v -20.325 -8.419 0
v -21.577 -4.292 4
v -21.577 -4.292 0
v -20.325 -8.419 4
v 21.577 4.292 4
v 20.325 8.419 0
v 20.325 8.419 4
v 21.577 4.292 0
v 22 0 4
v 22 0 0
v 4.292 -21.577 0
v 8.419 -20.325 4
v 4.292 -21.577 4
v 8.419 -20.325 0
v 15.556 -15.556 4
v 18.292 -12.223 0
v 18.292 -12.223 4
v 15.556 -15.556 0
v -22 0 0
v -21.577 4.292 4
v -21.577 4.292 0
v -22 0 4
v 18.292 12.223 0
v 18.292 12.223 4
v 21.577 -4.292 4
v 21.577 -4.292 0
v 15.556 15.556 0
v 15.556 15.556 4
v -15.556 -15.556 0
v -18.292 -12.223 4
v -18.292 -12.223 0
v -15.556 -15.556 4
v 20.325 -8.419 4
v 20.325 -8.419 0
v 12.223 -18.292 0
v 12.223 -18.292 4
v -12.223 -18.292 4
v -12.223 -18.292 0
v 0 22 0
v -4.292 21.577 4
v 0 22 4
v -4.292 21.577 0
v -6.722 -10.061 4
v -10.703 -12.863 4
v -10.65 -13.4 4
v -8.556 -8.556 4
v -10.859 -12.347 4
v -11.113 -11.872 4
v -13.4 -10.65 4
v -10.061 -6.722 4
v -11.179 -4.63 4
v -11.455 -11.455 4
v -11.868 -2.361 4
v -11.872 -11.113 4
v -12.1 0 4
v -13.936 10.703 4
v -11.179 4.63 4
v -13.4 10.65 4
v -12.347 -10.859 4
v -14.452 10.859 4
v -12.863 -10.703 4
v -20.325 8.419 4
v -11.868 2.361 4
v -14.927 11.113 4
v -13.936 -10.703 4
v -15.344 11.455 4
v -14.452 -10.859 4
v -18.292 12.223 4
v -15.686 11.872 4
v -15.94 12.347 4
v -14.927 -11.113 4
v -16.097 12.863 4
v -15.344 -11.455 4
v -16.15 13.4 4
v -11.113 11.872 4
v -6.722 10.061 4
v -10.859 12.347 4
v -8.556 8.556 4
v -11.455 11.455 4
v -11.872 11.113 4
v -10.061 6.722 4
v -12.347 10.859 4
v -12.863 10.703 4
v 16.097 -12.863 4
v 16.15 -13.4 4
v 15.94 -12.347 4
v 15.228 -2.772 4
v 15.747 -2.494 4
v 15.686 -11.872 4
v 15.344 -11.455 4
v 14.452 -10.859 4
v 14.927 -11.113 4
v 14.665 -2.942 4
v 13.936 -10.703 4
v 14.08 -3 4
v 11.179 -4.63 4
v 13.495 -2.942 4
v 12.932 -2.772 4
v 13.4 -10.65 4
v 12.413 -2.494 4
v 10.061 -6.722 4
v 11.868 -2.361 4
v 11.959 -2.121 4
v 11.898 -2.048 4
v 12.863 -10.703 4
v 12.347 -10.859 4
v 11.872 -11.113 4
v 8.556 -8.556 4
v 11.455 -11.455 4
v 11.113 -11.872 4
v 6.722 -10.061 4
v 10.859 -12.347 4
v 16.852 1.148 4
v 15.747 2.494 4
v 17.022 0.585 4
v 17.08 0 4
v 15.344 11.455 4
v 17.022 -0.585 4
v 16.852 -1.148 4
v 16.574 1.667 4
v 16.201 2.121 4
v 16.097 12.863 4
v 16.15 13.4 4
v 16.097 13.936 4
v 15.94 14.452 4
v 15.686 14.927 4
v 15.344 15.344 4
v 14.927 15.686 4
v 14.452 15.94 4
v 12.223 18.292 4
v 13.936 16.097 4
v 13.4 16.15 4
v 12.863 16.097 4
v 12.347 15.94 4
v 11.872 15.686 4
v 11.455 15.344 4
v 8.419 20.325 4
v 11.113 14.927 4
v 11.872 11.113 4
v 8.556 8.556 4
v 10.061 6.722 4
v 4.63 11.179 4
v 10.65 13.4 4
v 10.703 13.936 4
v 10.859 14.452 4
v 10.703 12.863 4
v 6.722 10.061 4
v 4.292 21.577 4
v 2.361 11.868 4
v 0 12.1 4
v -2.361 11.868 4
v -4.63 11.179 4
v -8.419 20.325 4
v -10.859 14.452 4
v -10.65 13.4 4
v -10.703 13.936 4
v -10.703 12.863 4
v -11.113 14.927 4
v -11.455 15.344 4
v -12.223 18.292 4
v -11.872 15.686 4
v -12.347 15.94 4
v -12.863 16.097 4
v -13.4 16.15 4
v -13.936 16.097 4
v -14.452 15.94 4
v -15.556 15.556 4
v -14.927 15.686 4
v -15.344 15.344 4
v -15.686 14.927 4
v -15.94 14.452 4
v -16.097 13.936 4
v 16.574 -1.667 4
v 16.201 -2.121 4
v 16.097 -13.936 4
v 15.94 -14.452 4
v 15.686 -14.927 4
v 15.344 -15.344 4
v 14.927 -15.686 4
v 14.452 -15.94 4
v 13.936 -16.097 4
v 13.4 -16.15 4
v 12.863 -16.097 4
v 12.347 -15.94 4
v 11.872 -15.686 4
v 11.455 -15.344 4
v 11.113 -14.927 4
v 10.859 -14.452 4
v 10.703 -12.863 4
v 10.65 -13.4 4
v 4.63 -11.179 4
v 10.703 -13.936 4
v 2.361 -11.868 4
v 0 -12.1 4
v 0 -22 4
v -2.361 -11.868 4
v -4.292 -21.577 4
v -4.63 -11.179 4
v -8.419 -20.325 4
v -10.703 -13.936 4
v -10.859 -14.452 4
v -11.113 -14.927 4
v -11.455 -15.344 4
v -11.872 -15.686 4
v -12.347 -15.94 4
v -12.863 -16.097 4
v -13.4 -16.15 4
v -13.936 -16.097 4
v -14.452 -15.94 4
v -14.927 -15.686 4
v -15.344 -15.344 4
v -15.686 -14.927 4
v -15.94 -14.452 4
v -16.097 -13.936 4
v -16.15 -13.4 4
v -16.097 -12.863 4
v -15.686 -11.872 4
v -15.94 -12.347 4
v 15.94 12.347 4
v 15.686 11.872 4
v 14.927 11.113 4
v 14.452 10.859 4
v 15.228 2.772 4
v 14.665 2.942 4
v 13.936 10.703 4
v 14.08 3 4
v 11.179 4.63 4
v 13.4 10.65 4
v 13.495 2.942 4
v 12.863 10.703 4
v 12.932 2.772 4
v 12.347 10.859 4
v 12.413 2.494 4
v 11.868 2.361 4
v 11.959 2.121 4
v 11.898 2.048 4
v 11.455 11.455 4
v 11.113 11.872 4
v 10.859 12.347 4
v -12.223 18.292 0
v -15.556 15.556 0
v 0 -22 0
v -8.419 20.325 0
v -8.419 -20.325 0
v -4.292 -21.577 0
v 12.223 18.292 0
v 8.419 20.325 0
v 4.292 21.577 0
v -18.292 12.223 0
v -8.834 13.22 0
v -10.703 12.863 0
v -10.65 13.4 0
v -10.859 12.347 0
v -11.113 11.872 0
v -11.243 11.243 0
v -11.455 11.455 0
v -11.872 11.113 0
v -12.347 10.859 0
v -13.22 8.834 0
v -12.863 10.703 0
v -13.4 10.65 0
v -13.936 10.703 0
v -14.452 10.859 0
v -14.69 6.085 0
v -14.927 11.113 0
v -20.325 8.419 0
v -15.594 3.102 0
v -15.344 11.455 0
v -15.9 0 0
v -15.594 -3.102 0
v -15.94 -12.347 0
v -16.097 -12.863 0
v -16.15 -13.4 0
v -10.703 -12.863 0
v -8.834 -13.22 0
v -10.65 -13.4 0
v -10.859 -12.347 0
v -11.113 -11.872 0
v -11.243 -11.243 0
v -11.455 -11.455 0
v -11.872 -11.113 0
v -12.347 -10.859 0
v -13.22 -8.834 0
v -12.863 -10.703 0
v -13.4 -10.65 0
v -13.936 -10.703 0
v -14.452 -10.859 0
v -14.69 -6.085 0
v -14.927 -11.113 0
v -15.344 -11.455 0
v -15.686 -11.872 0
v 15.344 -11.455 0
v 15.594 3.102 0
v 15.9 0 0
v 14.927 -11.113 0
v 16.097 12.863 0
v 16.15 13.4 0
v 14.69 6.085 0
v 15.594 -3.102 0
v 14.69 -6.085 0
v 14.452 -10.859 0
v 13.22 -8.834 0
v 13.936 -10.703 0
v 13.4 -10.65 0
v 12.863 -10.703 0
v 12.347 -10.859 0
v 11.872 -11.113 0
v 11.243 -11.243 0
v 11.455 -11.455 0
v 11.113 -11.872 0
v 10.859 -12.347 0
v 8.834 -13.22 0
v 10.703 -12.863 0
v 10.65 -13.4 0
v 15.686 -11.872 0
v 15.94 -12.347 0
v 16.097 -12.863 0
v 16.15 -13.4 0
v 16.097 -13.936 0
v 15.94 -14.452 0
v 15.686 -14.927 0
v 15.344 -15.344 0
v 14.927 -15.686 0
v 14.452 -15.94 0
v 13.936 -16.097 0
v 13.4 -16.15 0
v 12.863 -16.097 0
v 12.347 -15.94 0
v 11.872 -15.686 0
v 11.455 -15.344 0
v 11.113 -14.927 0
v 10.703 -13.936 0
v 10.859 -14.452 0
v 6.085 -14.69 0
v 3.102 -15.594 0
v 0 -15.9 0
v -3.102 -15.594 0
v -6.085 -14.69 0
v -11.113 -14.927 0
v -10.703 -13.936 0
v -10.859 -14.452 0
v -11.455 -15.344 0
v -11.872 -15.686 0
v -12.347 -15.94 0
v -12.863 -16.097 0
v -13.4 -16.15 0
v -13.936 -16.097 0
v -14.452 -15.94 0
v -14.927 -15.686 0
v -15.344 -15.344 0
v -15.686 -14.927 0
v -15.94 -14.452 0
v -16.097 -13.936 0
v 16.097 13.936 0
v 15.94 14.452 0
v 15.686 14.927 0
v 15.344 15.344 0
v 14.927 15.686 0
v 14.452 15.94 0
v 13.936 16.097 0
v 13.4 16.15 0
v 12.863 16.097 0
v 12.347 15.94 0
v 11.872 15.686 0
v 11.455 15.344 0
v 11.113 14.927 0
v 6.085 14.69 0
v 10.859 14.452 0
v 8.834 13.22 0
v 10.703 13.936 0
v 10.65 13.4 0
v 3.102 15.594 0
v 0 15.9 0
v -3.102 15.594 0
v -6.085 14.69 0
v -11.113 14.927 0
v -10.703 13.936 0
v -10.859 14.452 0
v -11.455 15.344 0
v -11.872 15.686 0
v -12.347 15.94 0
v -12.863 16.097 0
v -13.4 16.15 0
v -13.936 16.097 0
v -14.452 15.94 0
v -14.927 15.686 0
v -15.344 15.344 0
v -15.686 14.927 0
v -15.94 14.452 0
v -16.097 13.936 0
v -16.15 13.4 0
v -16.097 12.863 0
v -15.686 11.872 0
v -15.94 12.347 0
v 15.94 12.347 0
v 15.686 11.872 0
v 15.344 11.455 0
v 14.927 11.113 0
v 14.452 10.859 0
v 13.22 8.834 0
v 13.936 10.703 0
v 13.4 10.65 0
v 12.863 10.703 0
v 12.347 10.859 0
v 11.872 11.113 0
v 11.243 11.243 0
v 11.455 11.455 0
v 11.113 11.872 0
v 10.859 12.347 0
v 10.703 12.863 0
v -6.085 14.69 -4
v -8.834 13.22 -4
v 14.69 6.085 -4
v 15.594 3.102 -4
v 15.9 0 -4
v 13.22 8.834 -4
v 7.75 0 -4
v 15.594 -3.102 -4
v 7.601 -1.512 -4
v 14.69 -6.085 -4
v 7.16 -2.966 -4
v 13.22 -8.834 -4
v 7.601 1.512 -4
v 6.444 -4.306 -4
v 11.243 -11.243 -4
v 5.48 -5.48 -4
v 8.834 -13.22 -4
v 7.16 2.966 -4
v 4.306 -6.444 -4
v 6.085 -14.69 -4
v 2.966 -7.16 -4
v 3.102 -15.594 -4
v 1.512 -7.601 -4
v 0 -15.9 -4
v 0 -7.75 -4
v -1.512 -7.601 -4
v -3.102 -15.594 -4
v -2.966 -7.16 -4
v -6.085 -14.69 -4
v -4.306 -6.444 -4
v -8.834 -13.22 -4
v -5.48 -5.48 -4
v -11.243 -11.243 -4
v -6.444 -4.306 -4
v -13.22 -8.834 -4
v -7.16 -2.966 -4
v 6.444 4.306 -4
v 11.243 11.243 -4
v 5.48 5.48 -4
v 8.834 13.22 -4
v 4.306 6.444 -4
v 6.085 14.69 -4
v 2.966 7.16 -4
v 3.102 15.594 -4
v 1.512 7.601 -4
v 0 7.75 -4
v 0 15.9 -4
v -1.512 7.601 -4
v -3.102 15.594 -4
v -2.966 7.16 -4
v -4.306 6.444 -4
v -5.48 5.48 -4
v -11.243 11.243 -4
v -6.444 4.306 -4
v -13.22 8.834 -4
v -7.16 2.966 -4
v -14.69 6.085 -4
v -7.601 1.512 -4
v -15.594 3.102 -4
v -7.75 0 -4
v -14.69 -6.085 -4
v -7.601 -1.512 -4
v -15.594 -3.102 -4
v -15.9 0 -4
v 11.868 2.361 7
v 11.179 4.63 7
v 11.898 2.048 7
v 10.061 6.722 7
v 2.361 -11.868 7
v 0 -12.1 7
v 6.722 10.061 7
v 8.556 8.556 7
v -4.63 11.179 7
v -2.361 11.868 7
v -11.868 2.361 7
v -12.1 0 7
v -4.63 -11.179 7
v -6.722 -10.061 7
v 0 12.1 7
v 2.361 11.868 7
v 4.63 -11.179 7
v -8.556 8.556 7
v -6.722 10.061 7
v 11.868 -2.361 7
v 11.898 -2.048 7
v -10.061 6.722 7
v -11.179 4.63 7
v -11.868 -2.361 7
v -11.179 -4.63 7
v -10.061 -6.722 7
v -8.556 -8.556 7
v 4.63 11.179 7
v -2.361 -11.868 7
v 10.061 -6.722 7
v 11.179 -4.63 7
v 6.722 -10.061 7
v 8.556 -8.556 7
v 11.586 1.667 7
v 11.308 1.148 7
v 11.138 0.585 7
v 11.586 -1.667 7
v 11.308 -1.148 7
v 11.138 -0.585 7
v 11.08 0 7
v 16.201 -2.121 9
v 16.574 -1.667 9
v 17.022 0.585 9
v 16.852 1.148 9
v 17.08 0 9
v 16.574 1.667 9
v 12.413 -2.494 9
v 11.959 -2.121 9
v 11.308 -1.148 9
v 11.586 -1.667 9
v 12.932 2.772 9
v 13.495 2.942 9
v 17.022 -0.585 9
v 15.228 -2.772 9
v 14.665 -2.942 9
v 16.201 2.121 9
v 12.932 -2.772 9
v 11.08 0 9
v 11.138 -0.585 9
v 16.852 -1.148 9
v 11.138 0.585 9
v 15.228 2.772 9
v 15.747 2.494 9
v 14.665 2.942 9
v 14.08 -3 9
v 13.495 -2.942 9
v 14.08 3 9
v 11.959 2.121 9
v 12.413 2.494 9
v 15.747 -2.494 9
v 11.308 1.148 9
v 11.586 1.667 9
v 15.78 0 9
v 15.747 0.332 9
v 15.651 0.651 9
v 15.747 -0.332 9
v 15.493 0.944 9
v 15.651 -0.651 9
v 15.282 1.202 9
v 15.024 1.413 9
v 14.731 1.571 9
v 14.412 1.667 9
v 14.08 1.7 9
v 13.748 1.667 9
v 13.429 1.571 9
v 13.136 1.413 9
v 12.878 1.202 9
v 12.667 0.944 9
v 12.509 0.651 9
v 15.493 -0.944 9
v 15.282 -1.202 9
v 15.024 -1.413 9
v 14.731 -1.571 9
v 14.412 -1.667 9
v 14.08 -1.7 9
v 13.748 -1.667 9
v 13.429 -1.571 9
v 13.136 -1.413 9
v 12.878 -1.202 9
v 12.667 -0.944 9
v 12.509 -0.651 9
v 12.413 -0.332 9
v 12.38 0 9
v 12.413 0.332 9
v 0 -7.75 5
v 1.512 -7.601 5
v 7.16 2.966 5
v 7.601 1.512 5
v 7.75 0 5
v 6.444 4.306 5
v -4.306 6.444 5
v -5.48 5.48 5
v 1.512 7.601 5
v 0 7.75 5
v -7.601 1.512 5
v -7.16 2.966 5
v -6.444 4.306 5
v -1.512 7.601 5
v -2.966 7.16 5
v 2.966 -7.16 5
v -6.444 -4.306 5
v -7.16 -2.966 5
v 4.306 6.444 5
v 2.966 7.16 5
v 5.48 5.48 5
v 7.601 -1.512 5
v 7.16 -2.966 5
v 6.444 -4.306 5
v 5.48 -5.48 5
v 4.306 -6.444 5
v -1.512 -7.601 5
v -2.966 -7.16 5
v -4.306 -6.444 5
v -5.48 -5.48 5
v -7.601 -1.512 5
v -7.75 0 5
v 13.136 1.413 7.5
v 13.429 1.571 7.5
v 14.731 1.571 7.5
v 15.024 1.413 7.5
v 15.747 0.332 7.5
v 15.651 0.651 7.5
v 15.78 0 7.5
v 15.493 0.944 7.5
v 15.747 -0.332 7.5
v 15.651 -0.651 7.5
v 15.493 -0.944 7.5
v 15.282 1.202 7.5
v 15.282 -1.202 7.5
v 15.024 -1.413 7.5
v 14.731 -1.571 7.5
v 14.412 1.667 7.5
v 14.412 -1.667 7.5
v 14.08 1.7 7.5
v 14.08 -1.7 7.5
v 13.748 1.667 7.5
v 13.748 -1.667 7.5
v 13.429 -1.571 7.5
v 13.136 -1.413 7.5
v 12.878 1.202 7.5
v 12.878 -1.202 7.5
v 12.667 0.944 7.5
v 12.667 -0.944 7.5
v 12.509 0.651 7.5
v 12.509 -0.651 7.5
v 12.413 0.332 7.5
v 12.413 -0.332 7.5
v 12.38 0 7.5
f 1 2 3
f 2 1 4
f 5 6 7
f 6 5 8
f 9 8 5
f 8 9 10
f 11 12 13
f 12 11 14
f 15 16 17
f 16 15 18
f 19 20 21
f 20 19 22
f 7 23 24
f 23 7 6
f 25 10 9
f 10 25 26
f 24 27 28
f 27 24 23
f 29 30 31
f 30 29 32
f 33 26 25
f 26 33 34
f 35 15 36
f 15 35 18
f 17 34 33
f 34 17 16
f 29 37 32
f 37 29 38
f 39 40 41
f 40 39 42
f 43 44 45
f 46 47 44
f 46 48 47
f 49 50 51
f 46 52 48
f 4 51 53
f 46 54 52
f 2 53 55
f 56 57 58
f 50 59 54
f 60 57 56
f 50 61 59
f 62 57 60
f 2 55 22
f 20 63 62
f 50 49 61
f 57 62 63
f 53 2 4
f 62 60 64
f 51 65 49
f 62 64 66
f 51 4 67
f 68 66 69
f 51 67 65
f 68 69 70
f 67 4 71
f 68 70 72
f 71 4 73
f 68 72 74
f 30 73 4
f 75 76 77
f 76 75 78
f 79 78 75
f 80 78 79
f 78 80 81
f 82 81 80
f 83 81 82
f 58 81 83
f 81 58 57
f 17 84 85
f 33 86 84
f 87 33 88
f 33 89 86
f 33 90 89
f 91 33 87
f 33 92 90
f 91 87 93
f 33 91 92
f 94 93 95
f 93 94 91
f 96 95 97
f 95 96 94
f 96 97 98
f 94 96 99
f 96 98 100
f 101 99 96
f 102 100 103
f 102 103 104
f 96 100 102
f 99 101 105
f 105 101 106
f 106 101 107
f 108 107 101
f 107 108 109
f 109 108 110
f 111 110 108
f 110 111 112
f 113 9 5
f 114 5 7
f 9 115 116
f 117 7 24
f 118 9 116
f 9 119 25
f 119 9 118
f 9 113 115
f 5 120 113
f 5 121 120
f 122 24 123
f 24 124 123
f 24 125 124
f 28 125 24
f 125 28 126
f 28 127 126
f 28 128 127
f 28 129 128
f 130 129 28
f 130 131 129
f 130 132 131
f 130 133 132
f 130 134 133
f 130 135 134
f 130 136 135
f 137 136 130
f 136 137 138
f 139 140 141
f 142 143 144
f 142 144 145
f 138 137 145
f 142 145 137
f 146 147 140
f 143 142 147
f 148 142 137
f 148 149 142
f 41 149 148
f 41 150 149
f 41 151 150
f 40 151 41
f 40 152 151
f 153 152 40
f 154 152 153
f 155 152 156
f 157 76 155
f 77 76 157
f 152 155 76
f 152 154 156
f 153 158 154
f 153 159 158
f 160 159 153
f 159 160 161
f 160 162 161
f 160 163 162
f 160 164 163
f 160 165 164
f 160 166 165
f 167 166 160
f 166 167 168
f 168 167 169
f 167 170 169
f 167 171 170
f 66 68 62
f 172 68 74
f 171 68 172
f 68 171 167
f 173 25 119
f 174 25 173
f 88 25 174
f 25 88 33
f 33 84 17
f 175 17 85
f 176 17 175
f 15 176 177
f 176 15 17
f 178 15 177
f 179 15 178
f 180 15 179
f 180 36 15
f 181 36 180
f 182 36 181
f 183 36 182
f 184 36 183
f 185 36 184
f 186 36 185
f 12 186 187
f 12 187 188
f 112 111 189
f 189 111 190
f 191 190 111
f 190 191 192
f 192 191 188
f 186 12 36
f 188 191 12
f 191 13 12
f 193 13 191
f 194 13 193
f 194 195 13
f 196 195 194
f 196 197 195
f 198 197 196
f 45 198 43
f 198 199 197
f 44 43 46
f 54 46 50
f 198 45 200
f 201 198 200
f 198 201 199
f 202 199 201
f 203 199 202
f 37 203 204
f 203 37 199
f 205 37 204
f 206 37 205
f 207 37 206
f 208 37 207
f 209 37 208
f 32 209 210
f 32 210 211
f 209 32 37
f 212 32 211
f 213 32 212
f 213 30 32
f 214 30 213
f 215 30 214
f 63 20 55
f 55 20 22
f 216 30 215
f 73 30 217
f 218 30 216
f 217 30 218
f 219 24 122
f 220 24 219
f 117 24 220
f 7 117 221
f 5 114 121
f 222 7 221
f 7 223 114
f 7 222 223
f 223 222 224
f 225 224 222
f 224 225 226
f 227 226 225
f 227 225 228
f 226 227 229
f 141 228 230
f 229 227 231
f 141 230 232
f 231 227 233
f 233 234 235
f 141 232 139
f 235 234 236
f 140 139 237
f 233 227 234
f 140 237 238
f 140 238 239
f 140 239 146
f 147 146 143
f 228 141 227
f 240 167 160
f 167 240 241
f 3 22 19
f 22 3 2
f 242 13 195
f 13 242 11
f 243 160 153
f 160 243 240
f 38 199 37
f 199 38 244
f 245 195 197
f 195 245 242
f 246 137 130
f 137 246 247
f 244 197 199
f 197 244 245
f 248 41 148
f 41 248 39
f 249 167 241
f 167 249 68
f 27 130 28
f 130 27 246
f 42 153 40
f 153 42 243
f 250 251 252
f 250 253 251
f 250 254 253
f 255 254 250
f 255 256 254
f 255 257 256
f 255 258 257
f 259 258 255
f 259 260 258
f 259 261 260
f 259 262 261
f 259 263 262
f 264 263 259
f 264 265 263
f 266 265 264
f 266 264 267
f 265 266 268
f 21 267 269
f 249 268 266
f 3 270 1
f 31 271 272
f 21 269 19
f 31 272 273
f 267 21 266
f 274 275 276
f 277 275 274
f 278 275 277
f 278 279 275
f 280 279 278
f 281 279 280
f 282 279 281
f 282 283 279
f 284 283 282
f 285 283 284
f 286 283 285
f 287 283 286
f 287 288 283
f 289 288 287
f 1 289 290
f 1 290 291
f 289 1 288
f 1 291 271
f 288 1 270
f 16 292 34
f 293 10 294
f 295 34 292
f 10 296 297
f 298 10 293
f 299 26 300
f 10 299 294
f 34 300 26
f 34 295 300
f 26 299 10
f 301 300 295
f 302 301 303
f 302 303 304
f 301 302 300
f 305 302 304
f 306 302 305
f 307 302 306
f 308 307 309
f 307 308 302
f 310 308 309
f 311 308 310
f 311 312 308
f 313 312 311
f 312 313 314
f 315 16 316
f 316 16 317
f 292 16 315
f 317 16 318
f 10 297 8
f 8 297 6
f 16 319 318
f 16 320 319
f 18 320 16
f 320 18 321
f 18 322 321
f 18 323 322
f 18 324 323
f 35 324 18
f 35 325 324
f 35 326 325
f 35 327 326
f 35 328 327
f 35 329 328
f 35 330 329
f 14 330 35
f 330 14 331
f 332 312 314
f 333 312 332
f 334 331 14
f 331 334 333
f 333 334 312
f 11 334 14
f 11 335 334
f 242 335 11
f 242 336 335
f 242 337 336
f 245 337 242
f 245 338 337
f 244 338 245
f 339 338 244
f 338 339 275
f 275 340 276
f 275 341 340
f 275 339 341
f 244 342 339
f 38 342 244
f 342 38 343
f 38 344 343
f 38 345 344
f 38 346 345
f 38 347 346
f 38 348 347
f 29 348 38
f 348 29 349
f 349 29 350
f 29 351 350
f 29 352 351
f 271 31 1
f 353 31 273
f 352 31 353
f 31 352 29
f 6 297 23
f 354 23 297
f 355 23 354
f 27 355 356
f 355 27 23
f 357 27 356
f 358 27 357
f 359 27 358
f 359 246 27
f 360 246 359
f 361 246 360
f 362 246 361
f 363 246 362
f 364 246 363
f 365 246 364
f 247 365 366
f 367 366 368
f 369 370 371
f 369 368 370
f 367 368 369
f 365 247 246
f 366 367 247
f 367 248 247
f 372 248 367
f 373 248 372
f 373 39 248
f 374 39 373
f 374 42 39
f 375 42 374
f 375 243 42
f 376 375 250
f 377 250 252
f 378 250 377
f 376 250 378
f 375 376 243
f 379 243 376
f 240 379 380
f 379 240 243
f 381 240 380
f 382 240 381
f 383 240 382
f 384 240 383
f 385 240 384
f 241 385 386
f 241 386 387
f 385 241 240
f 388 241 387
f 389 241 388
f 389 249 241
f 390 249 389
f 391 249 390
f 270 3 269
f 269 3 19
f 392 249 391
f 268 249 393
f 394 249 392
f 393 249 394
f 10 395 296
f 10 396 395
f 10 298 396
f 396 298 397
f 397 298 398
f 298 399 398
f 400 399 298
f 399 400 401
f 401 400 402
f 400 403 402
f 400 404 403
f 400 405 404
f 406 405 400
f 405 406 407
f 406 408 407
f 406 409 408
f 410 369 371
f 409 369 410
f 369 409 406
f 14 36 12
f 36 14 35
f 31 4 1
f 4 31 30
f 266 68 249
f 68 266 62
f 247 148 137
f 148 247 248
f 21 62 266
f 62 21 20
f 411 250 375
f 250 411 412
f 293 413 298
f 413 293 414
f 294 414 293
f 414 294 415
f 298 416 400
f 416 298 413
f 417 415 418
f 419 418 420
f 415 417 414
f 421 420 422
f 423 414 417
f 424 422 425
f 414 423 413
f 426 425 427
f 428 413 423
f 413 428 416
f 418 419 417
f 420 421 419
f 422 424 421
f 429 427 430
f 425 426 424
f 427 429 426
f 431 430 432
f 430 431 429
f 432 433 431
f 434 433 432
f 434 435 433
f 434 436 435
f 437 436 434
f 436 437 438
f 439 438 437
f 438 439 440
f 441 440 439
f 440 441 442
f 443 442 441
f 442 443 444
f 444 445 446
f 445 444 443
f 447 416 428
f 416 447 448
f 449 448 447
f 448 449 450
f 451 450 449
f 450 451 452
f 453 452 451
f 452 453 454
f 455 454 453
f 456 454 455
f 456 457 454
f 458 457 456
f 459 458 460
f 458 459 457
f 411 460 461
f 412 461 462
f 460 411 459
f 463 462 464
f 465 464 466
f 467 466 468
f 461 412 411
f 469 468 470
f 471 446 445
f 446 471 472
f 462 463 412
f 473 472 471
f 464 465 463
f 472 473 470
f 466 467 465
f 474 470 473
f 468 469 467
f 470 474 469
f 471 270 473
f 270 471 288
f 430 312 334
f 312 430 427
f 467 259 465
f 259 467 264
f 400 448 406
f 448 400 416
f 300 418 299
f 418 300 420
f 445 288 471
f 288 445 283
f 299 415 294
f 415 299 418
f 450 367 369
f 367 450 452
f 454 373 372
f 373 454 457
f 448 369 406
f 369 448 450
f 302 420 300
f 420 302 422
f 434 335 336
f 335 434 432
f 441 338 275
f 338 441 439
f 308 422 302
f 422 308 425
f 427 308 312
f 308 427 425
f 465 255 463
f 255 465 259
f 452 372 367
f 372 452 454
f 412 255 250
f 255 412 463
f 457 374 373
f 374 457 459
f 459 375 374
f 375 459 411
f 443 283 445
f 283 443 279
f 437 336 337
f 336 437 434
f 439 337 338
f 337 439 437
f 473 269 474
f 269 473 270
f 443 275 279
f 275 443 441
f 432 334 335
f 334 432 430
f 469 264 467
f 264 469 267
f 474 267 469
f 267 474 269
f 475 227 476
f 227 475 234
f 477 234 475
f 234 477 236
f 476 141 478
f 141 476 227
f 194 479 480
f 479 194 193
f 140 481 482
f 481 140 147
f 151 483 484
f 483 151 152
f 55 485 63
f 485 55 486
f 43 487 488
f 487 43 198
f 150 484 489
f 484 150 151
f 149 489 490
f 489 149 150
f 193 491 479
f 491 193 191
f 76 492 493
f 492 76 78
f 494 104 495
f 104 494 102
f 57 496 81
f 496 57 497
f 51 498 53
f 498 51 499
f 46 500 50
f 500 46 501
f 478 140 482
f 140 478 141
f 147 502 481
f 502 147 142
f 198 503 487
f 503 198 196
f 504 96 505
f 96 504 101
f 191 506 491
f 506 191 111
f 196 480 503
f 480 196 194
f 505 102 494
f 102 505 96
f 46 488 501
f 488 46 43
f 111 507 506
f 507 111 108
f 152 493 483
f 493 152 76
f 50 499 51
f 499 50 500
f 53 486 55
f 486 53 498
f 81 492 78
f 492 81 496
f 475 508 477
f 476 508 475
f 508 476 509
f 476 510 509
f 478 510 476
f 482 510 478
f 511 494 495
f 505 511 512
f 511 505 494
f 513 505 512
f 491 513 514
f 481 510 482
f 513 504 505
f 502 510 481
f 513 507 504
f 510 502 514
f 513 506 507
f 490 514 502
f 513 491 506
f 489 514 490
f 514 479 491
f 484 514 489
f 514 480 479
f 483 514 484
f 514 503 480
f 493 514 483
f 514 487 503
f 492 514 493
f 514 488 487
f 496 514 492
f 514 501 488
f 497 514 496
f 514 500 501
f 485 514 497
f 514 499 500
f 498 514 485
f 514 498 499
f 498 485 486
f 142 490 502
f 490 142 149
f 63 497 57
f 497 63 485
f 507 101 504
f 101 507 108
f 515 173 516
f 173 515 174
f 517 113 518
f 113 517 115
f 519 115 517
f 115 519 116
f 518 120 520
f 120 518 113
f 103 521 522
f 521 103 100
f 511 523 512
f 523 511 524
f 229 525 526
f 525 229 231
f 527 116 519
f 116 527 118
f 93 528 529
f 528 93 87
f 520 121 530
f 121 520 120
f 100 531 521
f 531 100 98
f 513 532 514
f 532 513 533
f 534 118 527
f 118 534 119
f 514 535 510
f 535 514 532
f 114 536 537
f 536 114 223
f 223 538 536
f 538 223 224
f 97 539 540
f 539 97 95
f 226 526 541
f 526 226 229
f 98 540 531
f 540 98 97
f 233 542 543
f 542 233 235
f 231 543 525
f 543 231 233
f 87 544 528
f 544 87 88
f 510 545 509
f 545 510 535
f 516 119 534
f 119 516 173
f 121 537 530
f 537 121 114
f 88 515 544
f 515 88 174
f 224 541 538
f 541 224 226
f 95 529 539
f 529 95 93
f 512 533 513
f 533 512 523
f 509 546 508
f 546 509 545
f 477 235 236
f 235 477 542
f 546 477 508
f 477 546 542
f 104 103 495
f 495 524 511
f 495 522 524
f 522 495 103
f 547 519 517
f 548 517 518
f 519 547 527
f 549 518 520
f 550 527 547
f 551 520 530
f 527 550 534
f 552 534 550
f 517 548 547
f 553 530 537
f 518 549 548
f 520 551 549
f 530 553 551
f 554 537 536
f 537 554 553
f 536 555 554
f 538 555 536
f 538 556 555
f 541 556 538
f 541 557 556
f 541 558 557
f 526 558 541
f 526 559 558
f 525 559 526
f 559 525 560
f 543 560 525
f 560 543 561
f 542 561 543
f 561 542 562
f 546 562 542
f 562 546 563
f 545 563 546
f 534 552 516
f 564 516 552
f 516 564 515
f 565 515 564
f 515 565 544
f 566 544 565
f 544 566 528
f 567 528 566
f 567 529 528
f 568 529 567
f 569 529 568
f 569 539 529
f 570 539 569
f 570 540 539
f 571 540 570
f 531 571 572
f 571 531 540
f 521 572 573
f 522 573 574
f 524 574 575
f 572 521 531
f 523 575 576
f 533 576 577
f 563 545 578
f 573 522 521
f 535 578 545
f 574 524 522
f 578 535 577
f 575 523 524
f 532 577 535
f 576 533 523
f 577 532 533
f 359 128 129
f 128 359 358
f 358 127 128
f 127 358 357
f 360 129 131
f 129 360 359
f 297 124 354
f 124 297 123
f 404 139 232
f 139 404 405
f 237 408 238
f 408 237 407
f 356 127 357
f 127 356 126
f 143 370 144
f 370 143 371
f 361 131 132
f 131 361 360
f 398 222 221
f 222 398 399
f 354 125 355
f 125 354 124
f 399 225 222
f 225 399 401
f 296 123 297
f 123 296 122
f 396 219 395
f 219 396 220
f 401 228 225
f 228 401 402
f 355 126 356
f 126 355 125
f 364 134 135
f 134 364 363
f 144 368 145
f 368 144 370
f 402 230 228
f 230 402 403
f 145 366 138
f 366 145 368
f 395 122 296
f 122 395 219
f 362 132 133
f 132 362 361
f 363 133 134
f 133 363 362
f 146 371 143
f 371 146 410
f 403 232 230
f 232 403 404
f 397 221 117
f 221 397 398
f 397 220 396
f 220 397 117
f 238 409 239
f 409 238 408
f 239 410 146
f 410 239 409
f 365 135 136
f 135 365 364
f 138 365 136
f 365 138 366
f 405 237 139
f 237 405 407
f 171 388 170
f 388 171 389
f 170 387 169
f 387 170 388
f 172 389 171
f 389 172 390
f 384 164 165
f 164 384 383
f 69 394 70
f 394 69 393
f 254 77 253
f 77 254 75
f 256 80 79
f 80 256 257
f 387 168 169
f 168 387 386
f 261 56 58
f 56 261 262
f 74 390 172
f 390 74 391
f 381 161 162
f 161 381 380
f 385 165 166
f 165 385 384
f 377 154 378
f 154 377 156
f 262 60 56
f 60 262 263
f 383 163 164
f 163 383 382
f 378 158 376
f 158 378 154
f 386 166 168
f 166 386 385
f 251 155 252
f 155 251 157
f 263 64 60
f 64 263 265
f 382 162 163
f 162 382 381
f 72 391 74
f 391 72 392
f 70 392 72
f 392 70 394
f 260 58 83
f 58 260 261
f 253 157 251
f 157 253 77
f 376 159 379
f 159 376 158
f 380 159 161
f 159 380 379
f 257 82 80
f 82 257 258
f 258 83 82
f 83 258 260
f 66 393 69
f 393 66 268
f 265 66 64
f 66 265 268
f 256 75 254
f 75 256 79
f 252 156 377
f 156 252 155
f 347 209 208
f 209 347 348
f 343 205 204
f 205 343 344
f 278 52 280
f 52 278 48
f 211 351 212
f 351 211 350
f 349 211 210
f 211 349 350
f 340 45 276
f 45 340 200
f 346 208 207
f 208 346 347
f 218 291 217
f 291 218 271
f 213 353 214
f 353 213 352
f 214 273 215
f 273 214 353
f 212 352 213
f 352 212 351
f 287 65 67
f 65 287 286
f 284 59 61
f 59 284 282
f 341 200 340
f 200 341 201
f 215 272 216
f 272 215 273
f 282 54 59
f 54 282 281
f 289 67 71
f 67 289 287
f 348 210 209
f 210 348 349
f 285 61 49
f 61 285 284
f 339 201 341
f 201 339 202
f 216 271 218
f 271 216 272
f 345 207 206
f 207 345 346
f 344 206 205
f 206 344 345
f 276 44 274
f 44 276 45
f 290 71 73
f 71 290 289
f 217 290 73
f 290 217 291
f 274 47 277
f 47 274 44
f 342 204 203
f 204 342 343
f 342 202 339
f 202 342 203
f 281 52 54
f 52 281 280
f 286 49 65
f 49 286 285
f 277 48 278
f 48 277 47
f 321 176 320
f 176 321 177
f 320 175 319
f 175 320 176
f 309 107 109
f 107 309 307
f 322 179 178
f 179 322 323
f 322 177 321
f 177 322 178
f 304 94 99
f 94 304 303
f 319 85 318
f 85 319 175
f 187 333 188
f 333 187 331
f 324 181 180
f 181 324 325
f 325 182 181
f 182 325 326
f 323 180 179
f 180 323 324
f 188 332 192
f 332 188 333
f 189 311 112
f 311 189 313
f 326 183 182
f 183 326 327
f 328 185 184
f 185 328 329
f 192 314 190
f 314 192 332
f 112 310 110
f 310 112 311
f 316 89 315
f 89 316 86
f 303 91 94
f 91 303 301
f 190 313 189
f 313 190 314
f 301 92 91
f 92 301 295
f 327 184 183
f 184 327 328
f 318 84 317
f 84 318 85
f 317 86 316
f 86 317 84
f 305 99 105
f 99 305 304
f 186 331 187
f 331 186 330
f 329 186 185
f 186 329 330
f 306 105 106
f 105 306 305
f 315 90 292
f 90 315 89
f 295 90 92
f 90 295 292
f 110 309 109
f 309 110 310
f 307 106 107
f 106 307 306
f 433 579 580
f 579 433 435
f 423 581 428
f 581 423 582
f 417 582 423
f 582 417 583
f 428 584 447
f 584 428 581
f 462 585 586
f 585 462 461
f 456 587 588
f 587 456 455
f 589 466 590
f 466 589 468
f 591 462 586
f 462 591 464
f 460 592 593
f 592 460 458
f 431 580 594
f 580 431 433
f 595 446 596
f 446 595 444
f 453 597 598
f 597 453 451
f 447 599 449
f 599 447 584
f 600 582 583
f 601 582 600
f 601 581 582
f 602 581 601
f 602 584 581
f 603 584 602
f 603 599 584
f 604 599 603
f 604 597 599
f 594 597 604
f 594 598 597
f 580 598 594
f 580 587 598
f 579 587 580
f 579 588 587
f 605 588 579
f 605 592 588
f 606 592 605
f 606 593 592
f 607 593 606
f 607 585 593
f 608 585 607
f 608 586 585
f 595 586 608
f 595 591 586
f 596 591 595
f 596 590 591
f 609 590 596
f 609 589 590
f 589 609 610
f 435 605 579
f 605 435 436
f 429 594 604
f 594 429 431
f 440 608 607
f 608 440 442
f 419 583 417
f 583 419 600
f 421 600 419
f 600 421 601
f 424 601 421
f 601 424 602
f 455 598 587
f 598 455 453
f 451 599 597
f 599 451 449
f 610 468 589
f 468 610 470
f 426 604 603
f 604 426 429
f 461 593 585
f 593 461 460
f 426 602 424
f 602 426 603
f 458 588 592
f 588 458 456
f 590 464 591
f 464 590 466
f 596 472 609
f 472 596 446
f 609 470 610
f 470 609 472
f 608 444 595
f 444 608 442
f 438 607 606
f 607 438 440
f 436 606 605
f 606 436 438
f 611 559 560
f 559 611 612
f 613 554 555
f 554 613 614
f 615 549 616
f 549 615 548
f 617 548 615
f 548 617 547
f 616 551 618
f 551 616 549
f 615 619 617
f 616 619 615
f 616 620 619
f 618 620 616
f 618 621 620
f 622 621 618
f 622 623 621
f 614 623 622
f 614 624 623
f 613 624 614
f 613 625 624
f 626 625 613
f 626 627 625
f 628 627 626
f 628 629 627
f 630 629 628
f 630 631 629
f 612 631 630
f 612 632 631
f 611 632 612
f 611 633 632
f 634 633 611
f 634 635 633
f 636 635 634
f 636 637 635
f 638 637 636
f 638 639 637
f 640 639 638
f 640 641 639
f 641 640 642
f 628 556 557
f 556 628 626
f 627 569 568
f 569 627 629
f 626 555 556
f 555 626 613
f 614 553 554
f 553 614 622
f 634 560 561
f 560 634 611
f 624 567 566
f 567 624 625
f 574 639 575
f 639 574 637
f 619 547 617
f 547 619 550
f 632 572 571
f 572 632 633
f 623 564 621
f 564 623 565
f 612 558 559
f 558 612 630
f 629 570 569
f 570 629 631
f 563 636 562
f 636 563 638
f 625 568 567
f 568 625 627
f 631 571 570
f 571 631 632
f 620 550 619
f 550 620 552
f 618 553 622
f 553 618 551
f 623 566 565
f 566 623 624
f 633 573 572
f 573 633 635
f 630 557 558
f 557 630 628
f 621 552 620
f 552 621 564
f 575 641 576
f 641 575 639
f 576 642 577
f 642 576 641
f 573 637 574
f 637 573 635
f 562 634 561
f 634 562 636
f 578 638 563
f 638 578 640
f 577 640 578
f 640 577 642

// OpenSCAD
$fn = 32;

// ----------------------------------------------------------------------
// Retaining cap: 6002 cover, 44 mm, spigot 31.8 mm
// ----------------------------------------------------------------------

// --- parameters (mm) ---
cap_d = 44;               // cover diameter
cap_t = 4;                // cover thickness
lip_d = 31.8;             // spigot that enters the housing
lip_h = 4;                // spigot height
shaft_d = 15.5;           // shaft opening
bolt_d = 5.5;             // bolt clearance
bolt_r = 18.95;           // bolt circle radius
dome_h = 3;               // raised centre
nipple_d = 6;             // grease nipple boss
nipple_h = 5;             // grease nipple boss height

module cover() {
  cylinder(h = cap_t, d = cap_d);
}

module spigot() {
  /* sunk 1 mm into the cover; the spigot sets the overall height */
  translate([0, 0, -lip_h]) cylinder(h = lip_h + 1, d = lip_d);
}

module dome() {
  translate([0, 0, cap_t - 1]) cylinder(h = dome_h + 1, d = cap_d * 0.55);
}

module nipple() {
  translate([cap_d * 0.32, 0, cap_t - 1])
    cylinder(h = nipple_h + 1, d = nipple_d);
}

difference() {
  union() {
    cover();
    spigot();
    dome();
    nipple();
  }
  for (i = [0 : 3]) rotate([0, 0, 45 + i * 90]) translate([bolt_r, 0, -lip_h - 1])
    cylinder(h = lip_h + cap_t + 2, d = bolt_d);
  translate([0, 0, -lip_h - 1]) cylinder(h = lip_h + cap_t + 2, d = shaft_d);
  translate([cap_d * 0.32, 0, cap_t + nipple_h - 1.5]) cylinder(h = 4, d = 3.4);
}
